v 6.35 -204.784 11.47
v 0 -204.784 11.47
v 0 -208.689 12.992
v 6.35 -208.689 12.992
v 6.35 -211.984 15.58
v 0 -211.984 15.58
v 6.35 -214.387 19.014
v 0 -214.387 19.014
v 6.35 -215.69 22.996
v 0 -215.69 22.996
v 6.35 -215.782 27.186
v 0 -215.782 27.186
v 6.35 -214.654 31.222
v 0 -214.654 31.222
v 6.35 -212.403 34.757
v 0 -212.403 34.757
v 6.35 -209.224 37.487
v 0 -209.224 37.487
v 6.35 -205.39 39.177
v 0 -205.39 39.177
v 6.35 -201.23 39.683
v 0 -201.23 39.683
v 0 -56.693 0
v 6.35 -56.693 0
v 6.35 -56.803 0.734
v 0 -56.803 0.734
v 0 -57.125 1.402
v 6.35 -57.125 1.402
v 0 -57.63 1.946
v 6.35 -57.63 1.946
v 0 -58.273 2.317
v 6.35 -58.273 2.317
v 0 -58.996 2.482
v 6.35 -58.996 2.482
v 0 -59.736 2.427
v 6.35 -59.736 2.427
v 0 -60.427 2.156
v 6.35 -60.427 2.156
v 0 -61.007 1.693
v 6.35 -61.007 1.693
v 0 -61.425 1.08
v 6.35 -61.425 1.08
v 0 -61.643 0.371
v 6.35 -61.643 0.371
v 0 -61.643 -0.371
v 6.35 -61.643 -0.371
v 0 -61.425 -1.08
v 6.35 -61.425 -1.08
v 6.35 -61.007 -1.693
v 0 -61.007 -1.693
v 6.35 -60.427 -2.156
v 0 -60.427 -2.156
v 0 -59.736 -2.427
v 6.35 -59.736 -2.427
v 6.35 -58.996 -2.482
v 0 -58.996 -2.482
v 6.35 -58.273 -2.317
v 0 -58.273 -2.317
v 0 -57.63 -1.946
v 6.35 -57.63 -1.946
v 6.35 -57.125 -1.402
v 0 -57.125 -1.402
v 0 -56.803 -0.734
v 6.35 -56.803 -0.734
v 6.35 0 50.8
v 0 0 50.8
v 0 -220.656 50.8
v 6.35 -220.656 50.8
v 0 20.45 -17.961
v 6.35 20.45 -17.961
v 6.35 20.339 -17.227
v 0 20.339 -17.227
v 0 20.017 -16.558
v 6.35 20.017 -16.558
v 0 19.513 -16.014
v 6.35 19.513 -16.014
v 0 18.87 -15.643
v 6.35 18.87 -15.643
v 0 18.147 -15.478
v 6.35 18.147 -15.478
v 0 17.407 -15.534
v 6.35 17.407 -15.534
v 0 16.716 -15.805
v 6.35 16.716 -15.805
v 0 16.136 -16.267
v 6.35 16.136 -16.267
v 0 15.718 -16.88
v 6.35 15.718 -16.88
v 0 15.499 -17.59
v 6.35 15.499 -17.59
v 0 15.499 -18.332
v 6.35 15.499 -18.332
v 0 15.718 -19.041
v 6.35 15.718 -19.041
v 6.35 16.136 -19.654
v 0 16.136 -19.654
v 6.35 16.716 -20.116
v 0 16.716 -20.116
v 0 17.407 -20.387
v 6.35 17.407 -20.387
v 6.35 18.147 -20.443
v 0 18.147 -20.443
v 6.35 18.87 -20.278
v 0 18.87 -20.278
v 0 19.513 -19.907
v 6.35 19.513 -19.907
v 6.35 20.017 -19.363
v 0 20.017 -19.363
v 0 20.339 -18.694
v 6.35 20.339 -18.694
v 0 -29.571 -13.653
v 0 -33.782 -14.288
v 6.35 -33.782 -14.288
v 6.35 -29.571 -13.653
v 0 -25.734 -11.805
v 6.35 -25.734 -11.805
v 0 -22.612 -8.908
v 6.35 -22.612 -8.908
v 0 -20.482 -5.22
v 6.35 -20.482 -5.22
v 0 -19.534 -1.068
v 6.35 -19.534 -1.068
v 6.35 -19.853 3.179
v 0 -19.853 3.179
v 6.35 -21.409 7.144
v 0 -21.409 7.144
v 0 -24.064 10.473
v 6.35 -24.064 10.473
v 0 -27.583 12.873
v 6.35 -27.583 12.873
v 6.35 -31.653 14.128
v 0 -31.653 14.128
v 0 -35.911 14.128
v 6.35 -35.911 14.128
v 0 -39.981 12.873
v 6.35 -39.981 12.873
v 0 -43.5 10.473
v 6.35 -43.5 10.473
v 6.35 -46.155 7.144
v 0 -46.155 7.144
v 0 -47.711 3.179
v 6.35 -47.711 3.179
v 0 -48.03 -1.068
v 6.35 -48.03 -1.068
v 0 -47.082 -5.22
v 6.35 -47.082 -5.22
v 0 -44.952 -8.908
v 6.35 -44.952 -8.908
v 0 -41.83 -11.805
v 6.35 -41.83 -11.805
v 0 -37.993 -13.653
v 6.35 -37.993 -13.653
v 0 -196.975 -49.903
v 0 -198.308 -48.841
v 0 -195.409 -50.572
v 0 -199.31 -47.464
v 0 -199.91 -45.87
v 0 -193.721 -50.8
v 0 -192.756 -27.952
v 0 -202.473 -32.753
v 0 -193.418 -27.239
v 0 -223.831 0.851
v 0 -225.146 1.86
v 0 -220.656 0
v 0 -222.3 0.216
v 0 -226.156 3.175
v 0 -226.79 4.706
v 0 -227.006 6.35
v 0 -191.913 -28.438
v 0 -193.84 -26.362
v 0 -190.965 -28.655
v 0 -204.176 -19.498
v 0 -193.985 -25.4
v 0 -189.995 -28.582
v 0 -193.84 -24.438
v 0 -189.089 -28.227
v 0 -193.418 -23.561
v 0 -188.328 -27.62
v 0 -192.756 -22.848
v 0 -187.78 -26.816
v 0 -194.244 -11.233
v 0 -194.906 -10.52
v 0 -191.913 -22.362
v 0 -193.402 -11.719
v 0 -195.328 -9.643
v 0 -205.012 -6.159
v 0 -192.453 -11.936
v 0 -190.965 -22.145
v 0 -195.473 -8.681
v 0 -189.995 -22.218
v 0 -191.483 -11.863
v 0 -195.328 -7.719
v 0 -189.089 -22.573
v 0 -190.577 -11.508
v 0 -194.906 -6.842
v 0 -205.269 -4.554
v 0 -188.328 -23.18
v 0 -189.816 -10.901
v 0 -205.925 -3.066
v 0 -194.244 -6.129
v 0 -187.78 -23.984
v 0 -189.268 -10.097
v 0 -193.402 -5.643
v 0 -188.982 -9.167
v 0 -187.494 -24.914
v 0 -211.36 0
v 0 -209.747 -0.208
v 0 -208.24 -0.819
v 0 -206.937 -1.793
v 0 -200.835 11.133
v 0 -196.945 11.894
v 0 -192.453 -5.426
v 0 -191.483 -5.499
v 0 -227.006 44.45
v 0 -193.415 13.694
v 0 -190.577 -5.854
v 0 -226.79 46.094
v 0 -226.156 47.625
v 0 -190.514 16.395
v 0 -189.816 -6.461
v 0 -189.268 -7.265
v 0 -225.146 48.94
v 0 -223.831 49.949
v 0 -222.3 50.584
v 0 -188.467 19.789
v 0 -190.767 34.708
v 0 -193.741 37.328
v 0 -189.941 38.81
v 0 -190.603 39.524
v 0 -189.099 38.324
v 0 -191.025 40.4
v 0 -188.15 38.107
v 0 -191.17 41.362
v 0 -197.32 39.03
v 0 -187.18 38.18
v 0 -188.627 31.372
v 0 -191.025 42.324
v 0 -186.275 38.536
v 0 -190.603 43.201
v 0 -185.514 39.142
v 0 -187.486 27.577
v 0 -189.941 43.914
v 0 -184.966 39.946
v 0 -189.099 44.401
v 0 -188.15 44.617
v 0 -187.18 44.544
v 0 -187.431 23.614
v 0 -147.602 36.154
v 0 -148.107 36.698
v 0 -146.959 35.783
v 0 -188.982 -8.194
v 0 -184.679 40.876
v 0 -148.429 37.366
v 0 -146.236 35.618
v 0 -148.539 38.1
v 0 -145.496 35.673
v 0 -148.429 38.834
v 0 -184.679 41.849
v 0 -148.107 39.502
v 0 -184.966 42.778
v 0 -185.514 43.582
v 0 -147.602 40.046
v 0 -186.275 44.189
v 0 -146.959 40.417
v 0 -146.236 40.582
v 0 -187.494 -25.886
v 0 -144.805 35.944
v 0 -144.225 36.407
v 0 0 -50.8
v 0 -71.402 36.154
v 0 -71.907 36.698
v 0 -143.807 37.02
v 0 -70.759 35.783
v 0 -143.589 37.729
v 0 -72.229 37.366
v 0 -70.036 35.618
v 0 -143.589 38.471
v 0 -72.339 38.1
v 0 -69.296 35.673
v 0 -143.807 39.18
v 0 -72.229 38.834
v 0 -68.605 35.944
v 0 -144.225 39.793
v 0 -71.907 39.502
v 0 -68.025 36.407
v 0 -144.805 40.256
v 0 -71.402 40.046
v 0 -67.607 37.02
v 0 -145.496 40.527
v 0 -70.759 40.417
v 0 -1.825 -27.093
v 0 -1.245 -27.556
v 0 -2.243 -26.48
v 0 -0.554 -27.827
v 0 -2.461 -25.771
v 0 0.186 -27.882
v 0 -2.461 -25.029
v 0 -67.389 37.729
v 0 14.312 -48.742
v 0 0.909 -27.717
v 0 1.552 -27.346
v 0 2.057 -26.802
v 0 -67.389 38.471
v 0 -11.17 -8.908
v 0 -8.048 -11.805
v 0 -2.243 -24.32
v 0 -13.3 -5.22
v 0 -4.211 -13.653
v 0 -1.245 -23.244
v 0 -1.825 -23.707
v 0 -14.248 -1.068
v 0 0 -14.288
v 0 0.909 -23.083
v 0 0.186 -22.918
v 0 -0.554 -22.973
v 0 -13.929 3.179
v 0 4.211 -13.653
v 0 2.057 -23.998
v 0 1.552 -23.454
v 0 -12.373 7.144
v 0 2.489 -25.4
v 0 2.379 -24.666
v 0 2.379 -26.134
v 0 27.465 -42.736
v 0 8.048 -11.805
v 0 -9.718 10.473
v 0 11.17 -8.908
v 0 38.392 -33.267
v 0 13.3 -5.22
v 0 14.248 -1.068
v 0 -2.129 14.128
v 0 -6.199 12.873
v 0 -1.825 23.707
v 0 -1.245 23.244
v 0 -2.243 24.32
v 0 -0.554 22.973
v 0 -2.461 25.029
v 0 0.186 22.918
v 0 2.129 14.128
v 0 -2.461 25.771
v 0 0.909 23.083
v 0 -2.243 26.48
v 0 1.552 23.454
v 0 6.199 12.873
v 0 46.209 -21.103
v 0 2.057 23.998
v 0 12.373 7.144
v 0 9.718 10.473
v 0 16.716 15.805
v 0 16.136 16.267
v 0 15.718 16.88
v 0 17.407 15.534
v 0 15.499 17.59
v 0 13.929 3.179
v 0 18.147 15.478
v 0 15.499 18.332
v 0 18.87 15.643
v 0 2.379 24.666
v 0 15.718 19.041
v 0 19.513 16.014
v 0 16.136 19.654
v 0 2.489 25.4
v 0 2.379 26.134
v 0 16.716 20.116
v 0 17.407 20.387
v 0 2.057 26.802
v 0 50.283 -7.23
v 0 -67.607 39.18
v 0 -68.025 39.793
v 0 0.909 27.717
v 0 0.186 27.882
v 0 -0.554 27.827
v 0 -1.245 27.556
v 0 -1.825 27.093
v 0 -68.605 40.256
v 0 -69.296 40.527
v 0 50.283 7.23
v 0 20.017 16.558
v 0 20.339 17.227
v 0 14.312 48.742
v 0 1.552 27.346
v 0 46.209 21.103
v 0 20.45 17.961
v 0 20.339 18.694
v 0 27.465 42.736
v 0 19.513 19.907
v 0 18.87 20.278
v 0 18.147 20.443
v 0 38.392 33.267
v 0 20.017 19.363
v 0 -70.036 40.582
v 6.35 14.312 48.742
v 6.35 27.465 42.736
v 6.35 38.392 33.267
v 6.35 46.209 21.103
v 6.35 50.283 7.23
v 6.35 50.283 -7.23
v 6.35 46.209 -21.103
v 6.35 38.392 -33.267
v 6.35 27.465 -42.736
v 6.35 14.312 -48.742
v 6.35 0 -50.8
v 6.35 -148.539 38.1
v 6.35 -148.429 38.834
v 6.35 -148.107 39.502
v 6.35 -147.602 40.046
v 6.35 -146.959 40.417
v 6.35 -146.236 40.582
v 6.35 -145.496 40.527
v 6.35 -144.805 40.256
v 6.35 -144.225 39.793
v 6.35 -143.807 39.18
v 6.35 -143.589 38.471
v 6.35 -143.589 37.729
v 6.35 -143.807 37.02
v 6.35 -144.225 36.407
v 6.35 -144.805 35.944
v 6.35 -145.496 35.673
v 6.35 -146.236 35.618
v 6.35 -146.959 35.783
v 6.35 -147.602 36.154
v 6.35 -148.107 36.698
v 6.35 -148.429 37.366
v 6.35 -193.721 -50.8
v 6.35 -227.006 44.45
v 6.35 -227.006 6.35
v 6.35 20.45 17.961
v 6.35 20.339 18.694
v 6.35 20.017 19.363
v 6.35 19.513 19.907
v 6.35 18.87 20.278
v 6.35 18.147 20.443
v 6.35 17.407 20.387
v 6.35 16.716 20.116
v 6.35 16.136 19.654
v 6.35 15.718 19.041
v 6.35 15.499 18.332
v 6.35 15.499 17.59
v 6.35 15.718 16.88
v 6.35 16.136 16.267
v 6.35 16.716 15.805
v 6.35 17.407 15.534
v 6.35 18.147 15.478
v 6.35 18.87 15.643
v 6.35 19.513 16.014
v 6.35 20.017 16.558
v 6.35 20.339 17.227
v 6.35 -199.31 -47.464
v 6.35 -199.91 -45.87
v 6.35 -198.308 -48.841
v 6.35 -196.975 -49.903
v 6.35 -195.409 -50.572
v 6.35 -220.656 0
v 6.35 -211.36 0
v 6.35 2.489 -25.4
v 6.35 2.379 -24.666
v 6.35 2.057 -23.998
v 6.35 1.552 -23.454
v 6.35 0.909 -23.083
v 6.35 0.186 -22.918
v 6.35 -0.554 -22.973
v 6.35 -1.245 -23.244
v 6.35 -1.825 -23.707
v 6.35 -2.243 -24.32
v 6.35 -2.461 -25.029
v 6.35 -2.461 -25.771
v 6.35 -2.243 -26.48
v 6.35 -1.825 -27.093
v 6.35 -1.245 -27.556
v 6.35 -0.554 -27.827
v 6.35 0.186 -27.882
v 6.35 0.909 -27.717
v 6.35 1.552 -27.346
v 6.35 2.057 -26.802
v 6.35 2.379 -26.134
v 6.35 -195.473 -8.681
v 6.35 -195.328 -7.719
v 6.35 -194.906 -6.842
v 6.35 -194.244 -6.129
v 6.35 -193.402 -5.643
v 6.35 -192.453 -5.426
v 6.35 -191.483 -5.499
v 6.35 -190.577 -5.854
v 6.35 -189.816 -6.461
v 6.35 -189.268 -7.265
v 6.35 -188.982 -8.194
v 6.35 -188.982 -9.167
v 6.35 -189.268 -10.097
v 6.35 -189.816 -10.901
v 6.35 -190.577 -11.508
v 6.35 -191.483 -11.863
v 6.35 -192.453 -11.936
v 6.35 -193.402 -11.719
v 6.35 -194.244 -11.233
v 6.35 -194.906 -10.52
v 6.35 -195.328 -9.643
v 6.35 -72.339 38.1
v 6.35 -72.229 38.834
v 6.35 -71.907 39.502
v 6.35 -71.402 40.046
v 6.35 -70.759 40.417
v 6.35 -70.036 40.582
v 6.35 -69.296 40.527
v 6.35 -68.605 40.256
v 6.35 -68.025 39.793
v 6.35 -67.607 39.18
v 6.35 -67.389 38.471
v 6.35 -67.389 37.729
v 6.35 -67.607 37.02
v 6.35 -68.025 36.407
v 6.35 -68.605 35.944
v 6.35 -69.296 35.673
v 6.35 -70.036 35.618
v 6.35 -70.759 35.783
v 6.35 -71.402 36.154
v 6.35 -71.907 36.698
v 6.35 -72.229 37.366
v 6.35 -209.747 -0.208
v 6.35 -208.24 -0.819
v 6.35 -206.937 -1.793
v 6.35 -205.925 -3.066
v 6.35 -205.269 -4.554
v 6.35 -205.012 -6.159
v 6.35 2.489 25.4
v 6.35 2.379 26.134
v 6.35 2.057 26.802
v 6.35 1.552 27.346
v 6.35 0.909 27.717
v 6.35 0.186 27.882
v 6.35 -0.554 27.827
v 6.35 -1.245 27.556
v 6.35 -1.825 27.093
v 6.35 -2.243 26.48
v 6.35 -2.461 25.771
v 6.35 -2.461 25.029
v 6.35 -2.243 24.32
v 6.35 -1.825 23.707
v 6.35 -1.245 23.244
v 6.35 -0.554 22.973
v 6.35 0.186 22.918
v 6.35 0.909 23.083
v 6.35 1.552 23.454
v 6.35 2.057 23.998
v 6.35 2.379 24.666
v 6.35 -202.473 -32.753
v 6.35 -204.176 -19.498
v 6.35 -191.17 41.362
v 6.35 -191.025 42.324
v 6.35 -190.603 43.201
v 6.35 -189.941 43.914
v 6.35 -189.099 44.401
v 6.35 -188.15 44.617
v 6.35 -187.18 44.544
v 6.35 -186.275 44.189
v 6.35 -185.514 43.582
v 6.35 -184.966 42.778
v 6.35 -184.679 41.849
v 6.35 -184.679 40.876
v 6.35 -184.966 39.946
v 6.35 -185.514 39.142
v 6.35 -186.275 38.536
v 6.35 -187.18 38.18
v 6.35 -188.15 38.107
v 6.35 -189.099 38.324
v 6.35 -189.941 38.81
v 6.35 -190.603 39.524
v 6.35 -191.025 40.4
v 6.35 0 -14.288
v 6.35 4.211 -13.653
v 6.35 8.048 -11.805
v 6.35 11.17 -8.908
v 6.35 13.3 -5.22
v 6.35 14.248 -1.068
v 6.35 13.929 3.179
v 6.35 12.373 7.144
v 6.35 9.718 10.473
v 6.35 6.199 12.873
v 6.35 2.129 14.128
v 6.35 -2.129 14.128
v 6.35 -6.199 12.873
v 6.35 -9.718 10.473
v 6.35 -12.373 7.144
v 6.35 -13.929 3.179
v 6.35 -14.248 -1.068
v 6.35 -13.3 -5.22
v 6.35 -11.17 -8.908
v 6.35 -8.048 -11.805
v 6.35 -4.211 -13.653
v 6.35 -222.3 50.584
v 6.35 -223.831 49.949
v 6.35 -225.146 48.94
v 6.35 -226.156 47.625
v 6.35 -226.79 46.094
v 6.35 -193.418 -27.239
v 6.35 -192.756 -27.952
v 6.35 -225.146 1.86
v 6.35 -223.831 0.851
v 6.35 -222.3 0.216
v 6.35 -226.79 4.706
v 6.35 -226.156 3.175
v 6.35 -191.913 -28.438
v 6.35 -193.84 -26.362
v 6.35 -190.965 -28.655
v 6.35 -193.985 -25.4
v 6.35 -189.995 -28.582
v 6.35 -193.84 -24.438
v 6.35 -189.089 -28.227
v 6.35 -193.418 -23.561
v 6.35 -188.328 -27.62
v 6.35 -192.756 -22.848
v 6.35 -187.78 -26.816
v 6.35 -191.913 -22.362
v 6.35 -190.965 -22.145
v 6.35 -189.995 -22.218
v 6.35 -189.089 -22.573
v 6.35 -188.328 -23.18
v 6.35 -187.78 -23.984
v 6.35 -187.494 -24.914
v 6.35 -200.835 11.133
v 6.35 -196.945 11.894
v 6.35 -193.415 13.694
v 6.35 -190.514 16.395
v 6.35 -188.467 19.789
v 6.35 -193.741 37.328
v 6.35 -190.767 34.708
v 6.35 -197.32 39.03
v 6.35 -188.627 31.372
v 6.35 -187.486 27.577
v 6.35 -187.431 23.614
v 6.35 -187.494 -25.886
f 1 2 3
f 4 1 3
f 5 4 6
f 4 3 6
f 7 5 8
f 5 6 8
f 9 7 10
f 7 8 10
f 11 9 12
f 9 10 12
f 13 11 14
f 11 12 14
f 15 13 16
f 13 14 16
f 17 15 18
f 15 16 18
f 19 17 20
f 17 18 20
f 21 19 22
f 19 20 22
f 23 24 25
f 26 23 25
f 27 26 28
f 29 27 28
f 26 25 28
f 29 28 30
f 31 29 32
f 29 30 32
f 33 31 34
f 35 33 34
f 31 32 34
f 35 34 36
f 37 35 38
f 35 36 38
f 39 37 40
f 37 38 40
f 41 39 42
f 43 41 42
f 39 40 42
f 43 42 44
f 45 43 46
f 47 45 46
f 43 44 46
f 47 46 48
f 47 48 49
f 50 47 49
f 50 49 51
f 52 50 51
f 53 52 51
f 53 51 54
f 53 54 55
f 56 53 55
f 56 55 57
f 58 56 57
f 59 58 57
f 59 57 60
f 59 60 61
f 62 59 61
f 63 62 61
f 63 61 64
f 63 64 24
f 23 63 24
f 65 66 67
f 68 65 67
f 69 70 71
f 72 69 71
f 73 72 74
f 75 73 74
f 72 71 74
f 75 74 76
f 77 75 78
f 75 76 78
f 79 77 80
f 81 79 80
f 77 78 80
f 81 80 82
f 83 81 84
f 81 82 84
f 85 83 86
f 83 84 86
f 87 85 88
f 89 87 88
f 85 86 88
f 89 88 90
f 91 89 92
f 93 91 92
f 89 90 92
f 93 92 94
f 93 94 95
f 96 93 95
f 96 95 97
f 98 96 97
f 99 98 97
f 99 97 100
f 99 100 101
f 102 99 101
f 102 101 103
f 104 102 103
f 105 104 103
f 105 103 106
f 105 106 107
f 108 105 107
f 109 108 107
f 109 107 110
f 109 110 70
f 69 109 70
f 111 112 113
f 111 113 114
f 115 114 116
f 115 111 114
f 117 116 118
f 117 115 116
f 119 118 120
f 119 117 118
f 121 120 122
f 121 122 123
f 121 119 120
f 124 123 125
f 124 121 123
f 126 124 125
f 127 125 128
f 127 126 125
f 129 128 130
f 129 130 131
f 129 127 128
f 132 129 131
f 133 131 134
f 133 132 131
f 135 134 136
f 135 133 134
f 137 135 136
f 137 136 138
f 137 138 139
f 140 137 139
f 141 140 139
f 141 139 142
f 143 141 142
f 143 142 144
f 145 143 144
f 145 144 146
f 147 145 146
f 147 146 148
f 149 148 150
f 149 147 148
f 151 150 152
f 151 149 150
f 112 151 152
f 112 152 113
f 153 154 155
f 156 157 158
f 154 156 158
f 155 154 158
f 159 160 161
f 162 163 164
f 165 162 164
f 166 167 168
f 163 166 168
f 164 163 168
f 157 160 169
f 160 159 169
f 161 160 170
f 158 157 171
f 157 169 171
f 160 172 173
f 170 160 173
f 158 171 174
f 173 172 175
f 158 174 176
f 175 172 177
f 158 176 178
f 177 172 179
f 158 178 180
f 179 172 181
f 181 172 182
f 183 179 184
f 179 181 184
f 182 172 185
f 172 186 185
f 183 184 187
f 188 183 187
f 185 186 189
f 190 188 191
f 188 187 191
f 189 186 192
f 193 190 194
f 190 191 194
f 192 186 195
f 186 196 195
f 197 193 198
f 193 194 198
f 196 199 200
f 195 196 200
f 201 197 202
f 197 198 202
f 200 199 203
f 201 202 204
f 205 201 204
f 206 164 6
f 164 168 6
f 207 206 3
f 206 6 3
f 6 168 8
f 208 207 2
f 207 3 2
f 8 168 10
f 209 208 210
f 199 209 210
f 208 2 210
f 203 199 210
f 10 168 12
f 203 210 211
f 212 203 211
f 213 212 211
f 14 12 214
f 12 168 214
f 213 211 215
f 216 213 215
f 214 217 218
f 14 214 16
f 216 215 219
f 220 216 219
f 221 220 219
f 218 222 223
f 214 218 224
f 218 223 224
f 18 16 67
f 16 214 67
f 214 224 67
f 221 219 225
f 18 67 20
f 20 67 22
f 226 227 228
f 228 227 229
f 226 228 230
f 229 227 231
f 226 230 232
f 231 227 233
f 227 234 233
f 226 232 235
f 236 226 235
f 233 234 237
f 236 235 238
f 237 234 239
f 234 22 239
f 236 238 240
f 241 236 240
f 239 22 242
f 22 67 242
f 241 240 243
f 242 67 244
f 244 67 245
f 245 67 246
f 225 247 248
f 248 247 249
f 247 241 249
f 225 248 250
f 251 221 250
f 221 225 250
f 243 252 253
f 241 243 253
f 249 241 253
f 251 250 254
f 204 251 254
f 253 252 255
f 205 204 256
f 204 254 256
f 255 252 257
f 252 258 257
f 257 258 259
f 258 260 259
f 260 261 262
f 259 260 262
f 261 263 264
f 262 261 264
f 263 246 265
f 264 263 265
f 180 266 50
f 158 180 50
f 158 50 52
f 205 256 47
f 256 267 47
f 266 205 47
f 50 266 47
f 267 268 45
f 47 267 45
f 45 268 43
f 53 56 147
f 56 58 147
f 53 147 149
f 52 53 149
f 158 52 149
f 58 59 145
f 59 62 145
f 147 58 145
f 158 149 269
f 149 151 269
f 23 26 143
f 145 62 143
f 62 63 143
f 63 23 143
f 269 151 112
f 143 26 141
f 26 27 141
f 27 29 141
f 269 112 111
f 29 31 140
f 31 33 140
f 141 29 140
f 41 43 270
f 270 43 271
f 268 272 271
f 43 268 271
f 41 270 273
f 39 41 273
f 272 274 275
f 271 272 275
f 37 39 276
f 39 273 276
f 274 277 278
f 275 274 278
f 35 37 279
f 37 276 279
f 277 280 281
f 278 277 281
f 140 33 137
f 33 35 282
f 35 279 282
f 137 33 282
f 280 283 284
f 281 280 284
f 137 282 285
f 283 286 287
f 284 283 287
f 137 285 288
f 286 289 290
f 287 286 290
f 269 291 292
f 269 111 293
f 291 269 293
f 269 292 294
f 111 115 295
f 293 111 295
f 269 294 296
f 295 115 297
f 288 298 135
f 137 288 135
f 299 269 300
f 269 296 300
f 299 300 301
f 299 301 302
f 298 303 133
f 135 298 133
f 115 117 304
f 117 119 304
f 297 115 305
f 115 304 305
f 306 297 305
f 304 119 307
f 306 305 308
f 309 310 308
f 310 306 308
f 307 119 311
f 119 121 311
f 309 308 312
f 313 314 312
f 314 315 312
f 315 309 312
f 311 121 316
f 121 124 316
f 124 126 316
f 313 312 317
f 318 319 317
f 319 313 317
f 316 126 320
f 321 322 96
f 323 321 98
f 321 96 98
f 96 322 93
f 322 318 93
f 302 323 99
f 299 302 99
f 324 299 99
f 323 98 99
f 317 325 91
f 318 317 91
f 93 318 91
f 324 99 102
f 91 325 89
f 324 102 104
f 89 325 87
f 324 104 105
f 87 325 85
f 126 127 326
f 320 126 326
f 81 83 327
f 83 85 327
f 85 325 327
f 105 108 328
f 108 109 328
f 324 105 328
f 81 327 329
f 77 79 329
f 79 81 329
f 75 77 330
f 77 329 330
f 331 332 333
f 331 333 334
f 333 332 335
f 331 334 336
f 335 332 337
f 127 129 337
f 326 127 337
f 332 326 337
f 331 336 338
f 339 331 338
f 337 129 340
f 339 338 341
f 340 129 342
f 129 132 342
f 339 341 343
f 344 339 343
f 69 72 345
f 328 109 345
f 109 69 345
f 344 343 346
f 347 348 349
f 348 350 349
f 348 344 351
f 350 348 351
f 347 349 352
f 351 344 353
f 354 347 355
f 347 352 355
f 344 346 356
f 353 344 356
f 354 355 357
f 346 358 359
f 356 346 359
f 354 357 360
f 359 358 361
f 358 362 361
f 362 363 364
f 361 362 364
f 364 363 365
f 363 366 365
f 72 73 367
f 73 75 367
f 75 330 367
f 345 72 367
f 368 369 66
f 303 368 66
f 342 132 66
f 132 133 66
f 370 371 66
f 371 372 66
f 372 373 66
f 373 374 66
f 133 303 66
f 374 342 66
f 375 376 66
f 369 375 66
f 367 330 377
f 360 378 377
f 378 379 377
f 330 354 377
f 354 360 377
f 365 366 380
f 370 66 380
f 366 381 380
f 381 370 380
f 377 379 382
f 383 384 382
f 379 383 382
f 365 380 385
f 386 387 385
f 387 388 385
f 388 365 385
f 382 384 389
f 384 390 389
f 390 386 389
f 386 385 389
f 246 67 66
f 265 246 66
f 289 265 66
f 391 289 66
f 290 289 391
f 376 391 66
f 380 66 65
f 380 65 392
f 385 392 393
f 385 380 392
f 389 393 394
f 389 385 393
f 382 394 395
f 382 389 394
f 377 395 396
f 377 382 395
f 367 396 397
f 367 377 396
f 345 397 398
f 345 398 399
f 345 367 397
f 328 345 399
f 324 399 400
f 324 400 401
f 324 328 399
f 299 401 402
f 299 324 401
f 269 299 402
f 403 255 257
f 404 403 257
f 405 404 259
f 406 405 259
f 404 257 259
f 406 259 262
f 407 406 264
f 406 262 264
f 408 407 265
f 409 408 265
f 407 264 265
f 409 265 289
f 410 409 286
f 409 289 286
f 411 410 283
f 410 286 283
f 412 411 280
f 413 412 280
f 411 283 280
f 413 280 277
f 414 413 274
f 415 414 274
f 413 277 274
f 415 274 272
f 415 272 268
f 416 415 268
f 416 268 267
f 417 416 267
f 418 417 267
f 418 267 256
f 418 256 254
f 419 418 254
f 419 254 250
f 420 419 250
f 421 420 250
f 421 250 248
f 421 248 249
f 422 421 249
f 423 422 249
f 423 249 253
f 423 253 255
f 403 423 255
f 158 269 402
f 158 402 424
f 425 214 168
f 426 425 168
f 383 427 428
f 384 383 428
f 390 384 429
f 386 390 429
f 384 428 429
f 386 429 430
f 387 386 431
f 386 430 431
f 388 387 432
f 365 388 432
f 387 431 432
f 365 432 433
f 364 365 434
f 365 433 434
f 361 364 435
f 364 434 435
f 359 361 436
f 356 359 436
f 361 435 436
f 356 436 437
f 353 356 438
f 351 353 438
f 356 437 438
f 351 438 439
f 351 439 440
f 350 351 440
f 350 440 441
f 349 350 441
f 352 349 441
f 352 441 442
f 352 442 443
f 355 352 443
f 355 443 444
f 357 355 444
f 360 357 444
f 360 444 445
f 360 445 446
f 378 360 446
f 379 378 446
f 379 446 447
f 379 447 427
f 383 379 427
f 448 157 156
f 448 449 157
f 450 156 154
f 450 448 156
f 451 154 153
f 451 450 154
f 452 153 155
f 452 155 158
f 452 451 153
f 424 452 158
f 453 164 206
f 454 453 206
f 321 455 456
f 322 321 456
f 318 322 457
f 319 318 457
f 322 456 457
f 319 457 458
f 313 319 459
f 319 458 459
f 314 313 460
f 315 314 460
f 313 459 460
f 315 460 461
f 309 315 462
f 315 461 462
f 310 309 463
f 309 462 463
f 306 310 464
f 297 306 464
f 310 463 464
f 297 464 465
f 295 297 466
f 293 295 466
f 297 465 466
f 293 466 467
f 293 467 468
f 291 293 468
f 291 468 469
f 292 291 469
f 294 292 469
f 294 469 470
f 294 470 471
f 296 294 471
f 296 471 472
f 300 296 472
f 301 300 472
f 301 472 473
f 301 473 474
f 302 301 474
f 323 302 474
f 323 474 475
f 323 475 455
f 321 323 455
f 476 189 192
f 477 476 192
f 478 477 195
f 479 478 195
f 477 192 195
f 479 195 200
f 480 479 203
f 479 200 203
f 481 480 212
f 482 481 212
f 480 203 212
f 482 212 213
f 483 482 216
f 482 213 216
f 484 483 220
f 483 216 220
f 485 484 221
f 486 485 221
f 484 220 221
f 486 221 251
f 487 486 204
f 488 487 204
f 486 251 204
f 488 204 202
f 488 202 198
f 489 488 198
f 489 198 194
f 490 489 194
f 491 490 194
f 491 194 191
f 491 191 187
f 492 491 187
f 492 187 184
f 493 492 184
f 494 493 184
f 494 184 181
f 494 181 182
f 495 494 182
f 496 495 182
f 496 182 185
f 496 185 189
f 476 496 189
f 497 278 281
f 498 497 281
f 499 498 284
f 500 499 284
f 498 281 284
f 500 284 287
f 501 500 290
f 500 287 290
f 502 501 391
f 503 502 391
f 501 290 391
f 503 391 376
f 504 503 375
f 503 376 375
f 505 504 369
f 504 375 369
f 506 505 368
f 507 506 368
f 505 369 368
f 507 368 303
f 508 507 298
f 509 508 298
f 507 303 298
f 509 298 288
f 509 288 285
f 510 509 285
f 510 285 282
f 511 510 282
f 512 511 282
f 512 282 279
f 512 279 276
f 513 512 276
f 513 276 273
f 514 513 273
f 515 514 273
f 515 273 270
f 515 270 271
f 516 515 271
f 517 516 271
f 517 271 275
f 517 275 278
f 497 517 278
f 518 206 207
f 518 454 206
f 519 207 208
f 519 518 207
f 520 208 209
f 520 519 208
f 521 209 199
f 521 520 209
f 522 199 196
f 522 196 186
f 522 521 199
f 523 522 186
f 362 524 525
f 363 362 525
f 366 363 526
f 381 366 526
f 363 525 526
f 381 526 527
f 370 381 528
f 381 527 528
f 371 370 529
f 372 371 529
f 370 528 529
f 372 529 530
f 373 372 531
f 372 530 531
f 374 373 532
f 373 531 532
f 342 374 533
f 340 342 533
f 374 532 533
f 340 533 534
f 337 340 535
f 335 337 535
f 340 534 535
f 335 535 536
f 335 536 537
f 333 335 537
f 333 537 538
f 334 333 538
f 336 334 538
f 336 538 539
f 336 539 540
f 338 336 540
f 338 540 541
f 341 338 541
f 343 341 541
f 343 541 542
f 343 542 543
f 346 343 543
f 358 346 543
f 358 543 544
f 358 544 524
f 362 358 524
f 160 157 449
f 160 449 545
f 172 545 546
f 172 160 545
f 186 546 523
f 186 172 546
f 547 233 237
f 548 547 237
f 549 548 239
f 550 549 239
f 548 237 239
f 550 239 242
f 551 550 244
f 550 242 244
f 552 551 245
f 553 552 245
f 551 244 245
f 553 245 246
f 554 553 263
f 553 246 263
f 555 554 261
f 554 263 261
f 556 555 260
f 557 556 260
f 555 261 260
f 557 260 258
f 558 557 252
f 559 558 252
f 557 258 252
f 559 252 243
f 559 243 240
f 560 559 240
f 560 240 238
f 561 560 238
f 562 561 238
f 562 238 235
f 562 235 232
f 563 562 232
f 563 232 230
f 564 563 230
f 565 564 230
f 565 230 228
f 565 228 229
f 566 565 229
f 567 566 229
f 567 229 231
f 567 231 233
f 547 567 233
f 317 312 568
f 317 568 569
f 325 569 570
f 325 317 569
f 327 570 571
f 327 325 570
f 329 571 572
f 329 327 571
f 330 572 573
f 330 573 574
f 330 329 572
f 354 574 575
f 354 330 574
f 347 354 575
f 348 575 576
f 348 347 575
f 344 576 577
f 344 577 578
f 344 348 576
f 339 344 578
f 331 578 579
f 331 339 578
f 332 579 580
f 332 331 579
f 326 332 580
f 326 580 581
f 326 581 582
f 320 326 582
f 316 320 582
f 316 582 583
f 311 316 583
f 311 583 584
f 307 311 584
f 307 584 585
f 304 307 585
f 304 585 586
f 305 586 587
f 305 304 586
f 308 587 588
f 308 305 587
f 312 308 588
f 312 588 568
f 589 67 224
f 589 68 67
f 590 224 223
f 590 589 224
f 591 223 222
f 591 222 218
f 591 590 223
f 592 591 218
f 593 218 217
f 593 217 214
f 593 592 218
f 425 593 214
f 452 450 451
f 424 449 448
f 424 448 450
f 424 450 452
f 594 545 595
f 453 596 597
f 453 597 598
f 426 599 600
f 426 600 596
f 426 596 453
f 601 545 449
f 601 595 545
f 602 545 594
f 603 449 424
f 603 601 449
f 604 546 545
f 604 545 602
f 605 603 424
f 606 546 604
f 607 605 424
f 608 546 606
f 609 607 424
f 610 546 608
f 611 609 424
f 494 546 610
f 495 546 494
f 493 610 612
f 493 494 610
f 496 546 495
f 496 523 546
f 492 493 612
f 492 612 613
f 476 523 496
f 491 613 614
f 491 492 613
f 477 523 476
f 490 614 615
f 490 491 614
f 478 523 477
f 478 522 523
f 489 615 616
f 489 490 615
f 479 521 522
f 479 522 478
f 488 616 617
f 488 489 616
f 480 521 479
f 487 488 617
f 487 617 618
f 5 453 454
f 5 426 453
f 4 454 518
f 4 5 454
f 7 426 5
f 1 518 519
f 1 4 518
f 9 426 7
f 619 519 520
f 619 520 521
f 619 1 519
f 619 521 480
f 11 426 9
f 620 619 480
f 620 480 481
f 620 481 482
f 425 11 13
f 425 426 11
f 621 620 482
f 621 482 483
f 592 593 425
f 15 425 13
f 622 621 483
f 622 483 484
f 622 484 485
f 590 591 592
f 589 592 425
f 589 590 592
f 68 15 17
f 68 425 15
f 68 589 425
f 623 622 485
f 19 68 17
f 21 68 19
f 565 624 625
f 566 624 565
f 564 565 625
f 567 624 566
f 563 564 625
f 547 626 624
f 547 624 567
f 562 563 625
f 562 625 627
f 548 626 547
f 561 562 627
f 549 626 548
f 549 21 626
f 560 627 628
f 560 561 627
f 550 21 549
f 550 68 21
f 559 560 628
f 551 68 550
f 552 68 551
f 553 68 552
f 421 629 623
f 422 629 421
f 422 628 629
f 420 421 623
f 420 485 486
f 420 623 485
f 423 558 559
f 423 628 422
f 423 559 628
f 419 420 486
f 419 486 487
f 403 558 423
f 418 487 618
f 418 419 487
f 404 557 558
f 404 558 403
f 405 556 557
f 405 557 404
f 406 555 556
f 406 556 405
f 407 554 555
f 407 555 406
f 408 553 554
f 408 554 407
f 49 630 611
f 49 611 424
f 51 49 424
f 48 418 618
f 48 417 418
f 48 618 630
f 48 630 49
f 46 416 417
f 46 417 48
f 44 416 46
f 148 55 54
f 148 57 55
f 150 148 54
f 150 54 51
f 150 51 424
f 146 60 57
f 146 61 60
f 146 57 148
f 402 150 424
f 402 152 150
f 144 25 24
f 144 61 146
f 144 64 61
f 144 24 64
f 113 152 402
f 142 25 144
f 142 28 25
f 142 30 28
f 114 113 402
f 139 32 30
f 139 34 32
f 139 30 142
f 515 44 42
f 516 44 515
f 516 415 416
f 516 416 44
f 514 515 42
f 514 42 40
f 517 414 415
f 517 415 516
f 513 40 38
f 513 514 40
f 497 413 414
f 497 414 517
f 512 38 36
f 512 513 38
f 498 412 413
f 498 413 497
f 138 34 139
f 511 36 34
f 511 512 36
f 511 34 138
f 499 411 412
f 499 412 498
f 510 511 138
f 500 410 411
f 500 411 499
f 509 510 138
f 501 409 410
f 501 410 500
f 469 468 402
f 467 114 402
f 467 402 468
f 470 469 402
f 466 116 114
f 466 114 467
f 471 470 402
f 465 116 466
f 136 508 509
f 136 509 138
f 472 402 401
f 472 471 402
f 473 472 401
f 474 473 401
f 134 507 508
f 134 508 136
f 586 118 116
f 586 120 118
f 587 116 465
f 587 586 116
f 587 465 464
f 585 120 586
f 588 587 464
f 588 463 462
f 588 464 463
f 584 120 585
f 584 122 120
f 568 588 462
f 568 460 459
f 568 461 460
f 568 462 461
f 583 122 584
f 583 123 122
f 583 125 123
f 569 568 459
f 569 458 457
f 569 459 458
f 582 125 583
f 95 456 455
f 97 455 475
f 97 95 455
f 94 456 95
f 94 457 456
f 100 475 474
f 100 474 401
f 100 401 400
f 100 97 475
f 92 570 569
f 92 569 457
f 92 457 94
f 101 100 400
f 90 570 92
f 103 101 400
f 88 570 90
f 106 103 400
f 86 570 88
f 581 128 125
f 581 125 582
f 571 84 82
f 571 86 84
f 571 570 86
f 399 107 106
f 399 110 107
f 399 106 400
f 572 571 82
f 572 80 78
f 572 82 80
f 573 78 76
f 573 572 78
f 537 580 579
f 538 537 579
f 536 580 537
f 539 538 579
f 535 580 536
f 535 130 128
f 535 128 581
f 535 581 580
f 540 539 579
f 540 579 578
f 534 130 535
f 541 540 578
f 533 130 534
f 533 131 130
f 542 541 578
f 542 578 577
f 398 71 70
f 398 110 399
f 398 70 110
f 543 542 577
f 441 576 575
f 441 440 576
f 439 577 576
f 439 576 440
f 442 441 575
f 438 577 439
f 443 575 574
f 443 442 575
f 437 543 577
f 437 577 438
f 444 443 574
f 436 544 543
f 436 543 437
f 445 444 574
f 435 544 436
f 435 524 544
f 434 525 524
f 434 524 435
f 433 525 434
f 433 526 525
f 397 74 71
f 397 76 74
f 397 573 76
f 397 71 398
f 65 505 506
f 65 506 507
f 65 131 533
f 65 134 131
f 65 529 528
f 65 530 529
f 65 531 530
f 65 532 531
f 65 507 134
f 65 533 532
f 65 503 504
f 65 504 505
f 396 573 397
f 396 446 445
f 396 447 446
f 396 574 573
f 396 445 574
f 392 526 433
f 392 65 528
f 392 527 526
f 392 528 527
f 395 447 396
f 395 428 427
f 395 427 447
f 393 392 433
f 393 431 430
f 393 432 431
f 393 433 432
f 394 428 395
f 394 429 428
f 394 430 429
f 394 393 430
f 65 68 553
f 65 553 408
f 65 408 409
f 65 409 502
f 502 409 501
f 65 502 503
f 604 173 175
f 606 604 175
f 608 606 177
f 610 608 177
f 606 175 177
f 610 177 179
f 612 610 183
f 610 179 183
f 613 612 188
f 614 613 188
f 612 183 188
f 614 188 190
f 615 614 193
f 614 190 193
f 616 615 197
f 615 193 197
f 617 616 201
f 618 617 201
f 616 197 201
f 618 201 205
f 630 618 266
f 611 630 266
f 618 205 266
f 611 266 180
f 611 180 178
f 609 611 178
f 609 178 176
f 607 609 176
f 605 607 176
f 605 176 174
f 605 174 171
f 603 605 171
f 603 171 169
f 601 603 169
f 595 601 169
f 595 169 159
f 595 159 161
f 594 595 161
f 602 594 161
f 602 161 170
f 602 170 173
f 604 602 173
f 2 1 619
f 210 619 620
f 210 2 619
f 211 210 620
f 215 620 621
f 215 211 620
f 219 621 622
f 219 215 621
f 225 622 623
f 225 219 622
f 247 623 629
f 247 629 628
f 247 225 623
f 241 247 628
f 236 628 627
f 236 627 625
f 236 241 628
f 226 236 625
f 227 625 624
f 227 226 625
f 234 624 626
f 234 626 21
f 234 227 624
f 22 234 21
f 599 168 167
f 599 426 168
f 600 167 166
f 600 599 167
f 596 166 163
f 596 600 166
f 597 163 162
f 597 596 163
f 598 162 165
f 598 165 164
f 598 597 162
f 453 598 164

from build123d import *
from build123d.topology import SkipClean

# Parameters (mm, degrees)
SKETCH1_R                  = 14.2875
BOSS_EXTRUDE1_DEPTH        = 6.35
F_0_257_DIAMETER_HOLE1_D   = 6.5278
F_9_0_196_DIAMETER_HOLE1_D = 4.9784
F_9_0_196_DIAMETER_HOLE2_D = 4.9784
BOSS_EXTRUDE3_START        = -6.35
BOSS_EXTRUDE3_DEPTH        = 6.35
CUT_EXTRUDE1_START         = -6.35
SKETCH11_R                 = 14.2875
CUT_EXTRUDE1_DEPTH         = 6.35
FILLET1_R                  = 6.35


with BuildPart() as part:
    # Sketch1 → Boss-Extrude1 (new body)
    with BuildSketch(Plane.YZ):
        with BuildLine():
            Line((0, -50.8), (-198.714420778, -50.8))
            ThreePointArc((-198.714420778, -50.8), (-205.105, 0), (-198.714420778, 50.8))
            Line((-198.714420778, 50.8), (0, 50.8))
            ThreePointArc((0, 50.8), (50.8, 0), (0, -50.8))
        make_face()
        with Locations(Location((0, 0, 0), (0, 0, 270))):
            Circle(SKETCH1_R, mode=Mode.SUBTRACT)
        with Locations(Location((-33.782, 0, 0), (0, 0, 270))):
            Circle(SKETCH1_R, mode=Mode.SUBTRACT)
    extrude(amount=BOSS_EXTRUDE1_DEPTH)

    # F (0.257) Diameter Hole1 (through all)
    with Locations(Plane.YZ.offset(6.35)):
        with Locations((0, 0), (-190.721063402, -25.4), (-192.209068041, -8.680909393), (-187.906487547, 41.362252872)):
            Hole(F_0_257_DIAMETER_HOLE1_D / 2)

    # #9 (0.196) Diameter Hole1 (through all)
    with Locations(Plane.YZ.offset(6.35)):
        with Locations((-146.05, 38.1), (-69.85, 38.1)):
            Hole(F_9_0_196_DIAMETER_HOLE1_D / 2)

    # #9 (0.196) Diameter Hole2 (through all)
    with Locations(Plane(origin=(0, 0, 0), x_dir=(0, -1, 0), z_dir=(-1, 0, 0))):
        with Locations((59.182, 0), (0, 25.4), (0, -25.4), (-17.960512242, -17.960512242), (-17.960512242, 17.960512242)):
            Hole(F_9_0_196_DIAMETER_HOLE2_D / 2)

    # Sketch10 → Boss-Extrude3 (add)
    with BuildSketch(Plane.YZ.offset(6.35).offset(BOSS_EXTRUDE3_START)):
        with BuildLine():
            Line((-198.714420778, 50.8), (-227.006249903, 50.8))
            Line((-227.006249903, 50.8), (-227.006249903, 0))
            Line((-227.006249903, 0), (-205.105, 0))
            ThreePointArc((-205.105, 0), (-205.024737282, 5.737432126), (-204.784011946, 11.470373851))
            ThreePointArc((-204.784011946, 11.470373851), (-215.781689349, 27.1859375), (-201.229613759, 39.68253484))
            Line((-201.229613759, 39.68253484), (-198.714420778, 50.8))
        make_face()
    extrude(amount=BOSS_EXTRUDE3_DEPTH)

    # Sketch11 → Cut-Extrude1 (cut)
    with SkipClean():  # the faces are left unmerged after this step: merging them gives an invalid solid
        with BuildSketch(Plane.YZ.offset(6.35).offset(CUT_EXTRUDE1_START)):
            with Locations(Location((-201.606249903, 25.4, 0), (0, 0, 90))):
                Circle(SKETCH11_R)
        extrude(amount=CUT_EXTRUDE1_DEPTH, mode=Mode.SUBTRACT)

    # Fillet1
    fillet1_edges = [part.edges().sort_by_distance(p)[0] for p in [
        (3.175, -198.714420778, -50.8),
        (3.175, -205.105, 0),
        (3.175, -227.006249903, 0),
        (3.175, -227.006249903, 50.8),
    ]]
    fillet(fillet1_edges, radius=FILLET1_R)


solid = part.part
